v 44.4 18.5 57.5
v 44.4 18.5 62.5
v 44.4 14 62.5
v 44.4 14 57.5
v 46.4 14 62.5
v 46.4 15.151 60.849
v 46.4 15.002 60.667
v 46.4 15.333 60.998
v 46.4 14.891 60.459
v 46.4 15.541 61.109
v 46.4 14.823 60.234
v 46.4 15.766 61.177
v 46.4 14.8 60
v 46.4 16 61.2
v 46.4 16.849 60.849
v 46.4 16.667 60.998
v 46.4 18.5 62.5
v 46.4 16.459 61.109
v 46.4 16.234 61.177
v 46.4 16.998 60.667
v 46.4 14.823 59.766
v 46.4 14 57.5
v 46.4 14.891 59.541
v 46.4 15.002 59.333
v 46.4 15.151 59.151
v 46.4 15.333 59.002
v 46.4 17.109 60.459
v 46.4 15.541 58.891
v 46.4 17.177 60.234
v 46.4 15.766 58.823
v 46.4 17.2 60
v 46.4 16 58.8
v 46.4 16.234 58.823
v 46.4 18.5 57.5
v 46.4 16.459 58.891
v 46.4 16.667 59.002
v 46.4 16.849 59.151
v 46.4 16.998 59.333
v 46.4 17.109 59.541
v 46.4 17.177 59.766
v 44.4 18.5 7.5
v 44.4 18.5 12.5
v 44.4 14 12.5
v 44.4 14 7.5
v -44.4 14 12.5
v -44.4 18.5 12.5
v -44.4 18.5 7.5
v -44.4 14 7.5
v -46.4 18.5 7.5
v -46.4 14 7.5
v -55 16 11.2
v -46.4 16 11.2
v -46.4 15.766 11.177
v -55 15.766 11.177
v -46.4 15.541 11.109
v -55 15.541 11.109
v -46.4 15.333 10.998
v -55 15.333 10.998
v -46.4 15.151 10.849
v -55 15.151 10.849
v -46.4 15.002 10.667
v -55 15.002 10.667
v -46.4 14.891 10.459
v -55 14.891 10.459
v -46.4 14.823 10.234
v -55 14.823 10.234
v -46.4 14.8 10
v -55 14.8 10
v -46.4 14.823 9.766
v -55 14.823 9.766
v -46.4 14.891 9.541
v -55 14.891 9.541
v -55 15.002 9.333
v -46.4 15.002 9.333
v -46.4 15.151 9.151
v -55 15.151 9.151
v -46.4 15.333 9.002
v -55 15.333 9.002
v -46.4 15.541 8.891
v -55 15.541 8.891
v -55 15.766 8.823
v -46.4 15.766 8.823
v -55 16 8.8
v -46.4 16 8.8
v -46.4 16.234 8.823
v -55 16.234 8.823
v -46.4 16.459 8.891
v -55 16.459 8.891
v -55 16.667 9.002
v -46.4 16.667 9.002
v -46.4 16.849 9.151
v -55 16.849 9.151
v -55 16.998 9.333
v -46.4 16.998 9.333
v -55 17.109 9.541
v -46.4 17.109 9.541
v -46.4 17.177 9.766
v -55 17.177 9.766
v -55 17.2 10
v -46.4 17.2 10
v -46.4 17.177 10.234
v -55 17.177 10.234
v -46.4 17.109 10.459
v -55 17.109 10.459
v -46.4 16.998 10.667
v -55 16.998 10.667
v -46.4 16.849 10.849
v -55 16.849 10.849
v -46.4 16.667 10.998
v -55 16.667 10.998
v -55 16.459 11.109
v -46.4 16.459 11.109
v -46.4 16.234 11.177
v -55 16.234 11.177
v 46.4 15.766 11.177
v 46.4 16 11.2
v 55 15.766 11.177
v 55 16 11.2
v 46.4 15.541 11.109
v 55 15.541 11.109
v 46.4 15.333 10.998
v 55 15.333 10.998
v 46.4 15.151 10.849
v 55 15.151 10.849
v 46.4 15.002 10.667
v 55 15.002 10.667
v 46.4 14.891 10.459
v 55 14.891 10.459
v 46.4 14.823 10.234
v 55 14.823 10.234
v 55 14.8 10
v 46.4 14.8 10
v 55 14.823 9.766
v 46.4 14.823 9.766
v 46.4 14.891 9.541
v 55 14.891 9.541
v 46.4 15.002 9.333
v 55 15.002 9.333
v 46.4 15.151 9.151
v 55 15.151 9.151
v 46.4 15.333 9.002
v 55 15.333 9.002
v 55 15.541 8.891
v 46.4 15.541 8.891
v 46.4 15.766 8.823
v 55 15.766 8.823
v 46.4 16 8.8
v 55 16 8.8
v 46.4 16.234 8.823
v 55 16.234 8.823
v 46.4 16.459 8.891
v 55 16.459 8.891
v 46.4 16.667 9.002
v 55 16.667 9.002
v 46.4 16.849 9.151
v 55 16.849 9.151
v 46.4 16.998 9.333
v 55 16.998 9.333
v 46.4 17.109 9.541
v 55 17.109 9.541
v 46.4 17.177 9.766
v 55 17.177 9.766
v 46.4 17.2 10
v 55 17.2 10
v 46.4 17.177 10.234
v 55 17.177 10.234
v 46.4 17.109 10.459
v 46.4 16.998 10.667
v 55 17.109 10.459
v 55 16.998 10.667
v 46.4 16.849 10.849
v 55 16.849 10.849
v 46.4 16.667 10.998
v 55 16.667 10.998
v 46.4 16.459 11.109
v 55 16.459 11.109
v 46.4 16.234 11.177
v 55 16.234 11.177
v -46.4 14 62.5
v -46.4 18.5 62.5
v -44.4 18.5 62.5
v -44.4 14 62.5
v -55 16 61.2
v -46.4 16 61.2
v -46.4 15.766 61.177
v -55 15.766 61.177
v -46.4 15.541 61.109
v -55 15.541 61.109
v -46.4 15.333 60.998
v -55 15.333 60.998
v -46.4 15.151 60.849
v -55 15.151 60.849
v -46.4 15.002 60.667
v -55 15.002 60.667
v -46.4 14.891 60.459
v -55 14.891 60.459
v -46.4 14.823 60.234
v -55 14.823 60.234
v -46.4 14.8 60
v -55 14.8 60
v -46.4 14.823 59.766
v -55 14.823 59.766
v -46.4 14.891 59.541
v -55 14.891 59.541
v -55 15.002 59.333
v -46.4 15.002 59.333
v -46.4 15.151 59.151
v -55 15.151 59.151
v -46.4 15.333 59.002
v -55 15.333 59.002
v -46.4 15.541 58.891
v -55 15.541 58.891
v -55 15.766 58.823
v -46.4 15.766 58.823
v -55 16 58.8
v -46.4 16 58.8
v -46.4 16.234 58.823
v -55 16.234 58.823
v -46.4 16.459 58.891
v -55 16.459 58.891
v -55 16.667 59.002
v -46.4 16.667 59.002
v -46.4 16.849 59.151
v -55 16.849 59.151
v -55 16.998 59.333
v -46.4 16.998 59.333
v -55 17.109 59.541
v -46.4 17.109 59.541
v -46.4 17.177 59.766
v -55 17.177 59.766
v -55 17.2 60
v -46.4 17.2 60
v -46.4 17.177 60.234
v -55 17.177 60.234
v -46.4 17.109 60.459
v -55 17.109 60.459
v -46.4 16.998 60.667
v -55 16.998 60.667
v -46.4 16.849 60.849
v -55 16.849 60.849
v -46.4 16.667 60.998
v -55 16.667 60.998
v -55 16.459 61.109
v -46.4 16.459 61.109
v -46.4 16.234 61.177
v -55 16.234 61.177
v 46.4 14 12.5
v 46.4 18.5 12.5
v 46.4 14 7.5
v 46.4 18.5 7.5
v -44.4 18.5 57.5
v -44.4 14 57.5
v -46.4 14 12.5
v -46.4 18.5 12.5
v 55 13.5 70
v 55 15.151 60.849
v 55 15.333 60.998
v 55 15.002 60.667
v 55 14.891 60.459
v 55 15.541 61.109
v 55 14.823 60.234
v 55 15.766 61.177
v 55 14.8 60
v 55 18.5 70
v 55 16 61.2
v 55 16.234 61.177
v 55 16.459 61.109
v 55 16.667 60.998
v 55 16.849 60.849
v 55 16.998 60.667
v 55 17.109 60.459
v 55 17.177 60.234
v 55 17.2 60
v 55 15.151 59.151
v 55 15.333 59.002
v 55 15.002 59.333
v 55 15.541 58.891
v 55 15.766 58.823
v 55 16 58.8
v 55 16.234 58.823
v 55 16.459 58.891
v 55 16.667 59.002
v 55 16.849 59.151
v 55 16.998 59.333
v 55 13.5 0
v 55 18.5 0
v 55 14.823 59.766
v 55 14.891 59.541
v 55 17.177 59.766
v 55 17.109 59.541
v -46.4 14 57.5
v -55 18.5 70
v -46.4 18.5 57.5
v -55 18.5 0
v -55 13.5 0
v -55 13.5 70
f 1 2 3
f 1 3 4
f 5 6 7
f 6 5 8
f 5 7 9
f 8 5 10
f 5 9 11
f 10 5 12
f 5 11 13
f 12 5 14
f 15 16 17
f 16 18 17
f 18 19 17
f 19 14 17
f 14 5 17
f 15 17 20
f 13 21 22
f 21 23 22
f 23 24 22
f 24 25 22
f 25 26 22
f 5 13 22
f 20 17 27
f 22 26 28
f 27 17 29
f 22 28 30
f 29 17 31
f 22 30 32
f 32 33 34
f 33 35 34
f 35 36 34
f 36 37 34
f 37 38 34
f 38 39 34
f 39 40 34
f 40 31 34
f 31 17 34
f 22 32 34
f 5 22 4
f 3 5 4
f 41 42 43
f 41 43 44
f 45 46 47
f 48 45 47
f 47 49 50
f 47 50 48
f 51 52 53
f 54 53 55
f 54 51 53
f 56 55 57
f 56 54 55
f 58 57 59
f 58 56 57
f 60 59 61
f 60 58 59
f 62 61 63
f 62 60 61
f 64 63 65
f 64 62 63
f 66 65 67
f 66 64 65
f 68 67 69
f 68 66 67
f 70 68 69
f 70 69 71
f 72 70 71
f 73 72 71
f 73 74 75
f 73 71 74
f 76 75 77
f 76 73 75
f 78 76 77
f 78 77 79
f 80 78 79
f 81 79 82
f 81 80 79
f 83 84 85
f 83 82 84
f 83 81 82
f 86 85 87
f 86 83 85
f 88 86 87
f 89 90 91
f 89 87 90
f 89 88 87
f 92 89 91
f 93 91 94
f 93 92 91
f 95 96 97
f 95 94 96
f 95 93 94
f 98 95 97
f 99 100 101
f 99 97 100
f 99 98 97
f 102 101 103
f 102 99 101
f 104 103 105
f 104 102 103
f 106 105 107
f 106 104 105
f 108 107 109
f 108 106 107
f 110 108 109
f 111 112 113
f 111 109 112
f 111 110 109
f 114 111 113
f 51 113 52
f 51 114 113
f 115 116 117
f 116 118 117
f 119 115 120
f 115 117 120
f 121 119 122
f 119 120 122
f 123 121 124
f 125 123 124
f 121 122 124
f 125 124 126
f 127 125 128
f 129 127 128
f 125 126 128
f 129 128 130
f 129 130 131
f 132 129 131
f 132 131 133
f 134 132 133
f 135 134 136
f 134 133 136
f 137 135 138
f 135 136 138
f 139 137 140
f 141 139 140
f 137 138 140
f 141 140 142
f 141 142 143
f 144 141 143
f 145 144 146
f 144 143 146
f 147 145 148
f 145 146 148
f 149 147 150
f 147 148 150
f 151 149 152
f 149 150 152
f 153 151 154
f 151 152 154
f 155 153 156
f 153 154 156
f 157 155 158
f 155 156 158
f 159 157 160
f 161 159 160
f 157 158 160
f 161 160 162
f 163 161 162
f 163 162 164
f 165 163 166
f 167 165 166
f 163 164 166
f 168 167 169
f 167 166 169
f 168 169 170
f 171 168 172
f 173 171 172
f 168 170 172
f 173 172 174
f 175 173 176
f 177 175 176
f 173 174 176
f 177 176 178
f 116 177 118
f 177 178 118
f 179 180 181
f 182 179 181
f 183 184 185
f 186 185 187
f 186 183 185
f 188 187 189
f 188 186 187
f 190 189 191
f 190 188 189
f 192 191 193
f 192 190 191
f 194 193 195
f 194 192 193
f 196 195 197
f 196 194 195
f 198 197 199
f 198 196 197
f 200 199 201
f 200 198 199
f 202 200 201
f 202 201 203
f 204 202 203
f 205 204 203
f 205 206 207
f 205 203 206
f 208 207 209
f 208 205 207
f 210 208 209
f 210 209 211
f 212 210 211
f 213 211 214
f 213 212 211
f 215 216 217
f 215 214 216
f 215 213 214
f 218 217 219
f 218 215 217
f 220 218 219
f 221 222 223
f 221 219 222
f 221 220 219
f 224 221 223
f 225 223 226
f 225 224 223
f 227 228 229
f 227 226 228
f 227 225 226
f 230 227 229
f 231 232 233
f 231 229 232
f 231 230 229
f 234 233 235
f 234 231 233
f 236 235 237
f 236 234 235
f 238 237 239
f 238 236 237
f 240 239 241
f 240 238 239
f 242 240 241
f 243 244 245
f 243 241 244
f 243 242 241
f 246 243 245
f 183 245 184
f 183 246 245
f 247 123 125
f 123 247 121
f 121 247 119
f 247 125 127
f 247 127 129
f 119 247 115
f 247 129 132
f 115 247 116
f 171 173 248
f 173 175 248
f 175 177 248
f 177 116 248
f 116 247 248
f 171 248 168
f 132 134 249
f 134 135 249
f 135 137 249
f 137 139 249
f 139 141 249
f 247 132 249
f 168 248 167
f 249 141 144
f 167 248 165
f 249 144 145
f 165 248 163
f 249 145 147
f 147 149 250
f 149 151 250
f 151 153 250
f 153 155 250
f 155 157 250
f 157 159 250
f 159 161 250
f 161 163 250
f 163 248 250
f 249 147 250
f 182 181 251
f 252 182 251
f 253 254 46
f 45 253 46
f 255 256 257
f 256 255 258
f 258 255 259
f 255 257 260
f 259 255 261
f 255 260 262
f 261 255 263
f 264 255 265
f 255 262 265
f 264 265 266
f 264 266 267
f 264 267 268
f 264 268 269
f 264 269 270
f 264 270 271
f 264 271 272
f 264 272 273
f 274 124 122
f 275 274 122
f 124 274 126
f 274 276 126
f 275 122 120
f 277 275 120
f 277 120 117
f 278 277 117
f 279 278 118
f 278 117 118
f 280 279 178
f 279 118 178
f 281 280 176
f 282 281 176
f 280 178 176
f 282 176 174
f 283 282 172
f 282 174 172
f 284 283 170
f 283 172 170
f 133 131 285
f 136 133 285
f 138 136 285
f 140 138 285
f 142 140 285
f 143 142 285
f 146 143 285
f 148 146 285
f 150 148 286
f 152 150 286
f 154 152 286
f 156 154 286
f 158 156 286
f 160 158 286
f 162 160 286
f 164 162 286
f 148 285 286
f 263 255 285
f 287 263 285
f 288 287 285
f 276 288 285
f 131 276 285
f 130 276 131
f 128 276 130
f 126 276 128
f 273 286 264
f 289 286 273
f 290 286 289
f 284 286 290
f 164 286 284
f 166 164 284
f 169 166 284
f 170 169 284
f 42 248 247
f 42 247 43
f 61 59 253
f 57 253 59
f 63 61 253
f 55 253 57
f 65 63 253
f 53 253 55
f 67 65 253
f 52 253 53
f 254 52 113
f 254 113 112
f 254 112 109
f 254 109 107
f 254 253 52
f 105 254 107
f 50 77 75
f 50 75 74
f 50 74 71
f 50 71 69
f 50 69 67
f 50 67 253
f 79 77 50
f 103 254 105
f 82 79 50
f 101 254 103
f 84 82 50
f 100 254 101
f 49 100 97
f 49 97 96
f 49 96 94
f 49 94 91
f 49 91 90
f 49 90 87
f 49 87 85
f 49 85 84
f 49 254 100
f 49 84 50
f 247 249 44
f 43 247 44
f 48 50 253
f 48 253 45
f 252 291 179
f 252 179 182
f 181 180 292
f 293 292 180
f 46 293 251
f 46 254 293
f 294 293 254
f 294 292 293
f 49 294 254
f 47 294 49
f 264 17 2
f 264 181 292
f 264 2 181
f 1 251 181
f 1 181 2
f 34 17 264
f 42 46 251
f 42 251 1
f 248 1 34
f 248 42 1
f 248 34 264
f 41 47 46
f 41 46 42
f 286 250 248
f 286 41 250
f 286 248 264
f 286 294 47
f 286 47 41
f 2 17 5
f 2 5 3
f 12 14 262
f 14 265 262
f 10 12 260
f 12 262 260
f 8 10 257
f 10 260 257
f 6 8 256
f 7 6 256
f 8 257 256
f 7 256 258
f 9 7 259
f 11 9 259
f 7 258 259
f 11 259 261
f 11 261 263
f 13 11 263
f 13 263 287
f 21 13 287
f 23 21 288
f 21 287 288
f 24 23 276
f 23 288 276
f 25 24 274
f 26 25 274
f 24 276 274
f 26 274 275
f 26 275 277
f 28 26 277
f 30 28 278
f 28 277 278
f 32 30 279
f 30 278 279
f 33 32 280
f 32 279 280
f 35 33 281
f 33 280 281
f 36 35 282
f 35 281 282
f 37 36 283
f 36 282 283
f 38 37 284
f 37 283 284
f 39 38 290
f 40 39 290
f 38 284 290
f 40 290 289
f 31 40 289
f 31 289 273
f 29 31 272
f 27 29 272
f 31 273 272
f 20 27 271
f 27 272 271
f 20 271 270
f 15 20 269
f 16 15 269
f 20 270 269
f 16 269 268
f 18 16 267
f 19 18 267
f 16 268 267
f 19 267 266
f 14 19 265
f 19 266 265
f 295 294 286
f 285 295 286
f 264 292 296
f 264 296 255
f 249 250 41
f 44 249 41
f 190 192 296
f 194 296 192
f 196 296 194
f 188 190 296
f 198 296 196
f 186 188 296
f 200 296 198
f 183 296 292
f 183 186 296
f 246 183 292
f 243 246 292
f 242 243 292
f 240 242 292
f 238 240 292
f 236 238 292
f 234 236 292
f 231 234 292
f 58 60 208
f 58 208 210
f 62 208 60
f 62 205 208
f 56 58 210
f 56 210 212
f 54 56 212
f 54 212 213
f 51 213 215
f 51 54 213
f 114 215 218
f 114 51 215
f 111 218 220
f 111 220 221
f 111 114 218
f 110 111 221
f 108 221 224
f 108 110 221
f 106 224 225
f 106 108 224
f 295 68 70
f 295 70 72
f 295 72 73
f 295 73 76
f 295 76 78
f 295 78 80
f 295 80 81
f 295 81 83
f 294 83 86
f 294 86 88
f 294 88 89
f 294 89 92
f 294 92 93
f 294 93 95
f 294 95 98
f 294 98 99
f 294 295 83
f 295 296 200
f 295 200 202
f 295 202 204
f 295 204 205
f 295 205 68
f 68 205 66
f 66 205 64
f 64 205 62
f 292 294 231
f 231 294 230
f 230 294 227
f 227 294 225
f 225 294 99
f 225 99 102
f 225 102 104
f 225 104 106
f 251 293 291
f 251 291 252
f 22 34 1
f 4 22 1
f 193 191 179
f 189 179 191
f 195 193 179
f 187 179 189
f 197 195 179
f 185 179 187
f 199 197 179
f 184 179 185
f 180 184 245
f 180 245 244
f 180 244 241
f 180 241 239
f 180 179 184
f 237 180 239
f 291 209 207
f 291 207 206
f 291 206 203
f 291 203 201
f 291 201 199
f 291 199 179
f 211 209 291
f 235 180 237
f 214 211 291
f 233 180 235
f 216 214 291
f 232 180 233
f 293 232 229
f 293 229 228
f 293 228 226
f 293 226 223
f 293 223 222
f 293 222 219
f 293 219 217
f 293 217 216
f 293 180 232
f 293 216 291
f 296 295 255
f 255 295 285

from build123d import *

# Parameters (mm, degrees)
SKETCH1_W                     = 110
SKETCH1_H                     = 5
BOSS_EXTRUDE1_DEPTH           = 70
M2_CLEARANCE_HOLE1_AT_2_COUNT = 2
M2_CLEARANCE_HOLE1_AT_2_PITCH = 50
SKETCH4_W                     = 2
SKETCH4_H                     = 5
CUT_EXTRUDE1_DEPTH            = 4.5


with BuildPart() as part:
    # Sketch1 → Boss-Extrude1 (new body)
    with BuildSketch(Plane.XY):
        with Locations((0, 16)):
            Rectangle(SKETCH1_W, SKETCH1_H)
    extrude(amount=BOSS_EXTRUDE1_DEPTH)

    # Sketch3 → M2 Clearance Hole1 (revolve, cut)
    with BuildSketch(Plane(origin=(-55, 16, 10), x_dir=(0, 0, 1), z_dir=(0, 1, 0))):
        Polygon((0, 0), (0, 9.721032743), (1.2, 9), (1.2, 0), align=None)
    m2_clearance_hole1 = revolve(axis=Axis((-61.35, 16, 10), (1, 0, 0)), mode=Mode.SUBTRACT)

    # M2 Clearance Hole1 at 2: M2 Clearance Hole1 ×2
    with Locations(*[(0, 0, i * M2_CLEARANCE_HOLE1_AT_2_PITCH) for i in range(1, M2_CLEARANCE_HOLE1_AT_2_COUNT)]):
        add(m2_clearance_hole1, mode=Mode.SUBTRACT)

    # Sketch4 → Cut-Extrude1 (cut)
    with BuildSketch(Plane(origin=(0, 18.5, 0), x_dir=(1, 0, 0), z_dir=(0, 1, 0))):
        with Locations((-45.4, -60)):
            Rectangle(SKETCH4_W, SKETCH4_H)
        with Locations((-45.4, -10)):
            Rectangle(SKETCH4_W, SKETCH4_H)
    cut_extrude1 = extrude(amount=-CUT_EXTRUDE1_DEPTH, mode=Mode.SUBTRACT)

    # Mirror1: M2 Clearance Hole1, Cut-Extrude1 across plane
    add(m2_clearance_hole1.mirror(Plane(origin=(0, 0, 0), x_dir=(0, 0, 1), z_dir=(1, 0, 0))), mode=Mode.SUBTRACT)
    add(cut_extrude1.mirror(Plane(origin=(0, 0, 0), x_dir=(0, 0, 1), z_dir=(1, 0, 0))), mode=Mode.SUBTRACT)

    # Mirror1 copy 1 sketch → Mirror1 copy 1 (revolve, cut)
    with BuildSketch(Plane(origin=(55, 16, 60), x_dir=(0, 0, 1), z_dir=(0, 1, 0))):
        Polygon((0, 0), (0, -9.721032743), (1.2, -9), (1.2, 0), align=None)
    revolve(axis=Axis((61.35, 16, 60), (1, 0, 0)), mode=Mode.SUBTRACT)


solid = part.part
